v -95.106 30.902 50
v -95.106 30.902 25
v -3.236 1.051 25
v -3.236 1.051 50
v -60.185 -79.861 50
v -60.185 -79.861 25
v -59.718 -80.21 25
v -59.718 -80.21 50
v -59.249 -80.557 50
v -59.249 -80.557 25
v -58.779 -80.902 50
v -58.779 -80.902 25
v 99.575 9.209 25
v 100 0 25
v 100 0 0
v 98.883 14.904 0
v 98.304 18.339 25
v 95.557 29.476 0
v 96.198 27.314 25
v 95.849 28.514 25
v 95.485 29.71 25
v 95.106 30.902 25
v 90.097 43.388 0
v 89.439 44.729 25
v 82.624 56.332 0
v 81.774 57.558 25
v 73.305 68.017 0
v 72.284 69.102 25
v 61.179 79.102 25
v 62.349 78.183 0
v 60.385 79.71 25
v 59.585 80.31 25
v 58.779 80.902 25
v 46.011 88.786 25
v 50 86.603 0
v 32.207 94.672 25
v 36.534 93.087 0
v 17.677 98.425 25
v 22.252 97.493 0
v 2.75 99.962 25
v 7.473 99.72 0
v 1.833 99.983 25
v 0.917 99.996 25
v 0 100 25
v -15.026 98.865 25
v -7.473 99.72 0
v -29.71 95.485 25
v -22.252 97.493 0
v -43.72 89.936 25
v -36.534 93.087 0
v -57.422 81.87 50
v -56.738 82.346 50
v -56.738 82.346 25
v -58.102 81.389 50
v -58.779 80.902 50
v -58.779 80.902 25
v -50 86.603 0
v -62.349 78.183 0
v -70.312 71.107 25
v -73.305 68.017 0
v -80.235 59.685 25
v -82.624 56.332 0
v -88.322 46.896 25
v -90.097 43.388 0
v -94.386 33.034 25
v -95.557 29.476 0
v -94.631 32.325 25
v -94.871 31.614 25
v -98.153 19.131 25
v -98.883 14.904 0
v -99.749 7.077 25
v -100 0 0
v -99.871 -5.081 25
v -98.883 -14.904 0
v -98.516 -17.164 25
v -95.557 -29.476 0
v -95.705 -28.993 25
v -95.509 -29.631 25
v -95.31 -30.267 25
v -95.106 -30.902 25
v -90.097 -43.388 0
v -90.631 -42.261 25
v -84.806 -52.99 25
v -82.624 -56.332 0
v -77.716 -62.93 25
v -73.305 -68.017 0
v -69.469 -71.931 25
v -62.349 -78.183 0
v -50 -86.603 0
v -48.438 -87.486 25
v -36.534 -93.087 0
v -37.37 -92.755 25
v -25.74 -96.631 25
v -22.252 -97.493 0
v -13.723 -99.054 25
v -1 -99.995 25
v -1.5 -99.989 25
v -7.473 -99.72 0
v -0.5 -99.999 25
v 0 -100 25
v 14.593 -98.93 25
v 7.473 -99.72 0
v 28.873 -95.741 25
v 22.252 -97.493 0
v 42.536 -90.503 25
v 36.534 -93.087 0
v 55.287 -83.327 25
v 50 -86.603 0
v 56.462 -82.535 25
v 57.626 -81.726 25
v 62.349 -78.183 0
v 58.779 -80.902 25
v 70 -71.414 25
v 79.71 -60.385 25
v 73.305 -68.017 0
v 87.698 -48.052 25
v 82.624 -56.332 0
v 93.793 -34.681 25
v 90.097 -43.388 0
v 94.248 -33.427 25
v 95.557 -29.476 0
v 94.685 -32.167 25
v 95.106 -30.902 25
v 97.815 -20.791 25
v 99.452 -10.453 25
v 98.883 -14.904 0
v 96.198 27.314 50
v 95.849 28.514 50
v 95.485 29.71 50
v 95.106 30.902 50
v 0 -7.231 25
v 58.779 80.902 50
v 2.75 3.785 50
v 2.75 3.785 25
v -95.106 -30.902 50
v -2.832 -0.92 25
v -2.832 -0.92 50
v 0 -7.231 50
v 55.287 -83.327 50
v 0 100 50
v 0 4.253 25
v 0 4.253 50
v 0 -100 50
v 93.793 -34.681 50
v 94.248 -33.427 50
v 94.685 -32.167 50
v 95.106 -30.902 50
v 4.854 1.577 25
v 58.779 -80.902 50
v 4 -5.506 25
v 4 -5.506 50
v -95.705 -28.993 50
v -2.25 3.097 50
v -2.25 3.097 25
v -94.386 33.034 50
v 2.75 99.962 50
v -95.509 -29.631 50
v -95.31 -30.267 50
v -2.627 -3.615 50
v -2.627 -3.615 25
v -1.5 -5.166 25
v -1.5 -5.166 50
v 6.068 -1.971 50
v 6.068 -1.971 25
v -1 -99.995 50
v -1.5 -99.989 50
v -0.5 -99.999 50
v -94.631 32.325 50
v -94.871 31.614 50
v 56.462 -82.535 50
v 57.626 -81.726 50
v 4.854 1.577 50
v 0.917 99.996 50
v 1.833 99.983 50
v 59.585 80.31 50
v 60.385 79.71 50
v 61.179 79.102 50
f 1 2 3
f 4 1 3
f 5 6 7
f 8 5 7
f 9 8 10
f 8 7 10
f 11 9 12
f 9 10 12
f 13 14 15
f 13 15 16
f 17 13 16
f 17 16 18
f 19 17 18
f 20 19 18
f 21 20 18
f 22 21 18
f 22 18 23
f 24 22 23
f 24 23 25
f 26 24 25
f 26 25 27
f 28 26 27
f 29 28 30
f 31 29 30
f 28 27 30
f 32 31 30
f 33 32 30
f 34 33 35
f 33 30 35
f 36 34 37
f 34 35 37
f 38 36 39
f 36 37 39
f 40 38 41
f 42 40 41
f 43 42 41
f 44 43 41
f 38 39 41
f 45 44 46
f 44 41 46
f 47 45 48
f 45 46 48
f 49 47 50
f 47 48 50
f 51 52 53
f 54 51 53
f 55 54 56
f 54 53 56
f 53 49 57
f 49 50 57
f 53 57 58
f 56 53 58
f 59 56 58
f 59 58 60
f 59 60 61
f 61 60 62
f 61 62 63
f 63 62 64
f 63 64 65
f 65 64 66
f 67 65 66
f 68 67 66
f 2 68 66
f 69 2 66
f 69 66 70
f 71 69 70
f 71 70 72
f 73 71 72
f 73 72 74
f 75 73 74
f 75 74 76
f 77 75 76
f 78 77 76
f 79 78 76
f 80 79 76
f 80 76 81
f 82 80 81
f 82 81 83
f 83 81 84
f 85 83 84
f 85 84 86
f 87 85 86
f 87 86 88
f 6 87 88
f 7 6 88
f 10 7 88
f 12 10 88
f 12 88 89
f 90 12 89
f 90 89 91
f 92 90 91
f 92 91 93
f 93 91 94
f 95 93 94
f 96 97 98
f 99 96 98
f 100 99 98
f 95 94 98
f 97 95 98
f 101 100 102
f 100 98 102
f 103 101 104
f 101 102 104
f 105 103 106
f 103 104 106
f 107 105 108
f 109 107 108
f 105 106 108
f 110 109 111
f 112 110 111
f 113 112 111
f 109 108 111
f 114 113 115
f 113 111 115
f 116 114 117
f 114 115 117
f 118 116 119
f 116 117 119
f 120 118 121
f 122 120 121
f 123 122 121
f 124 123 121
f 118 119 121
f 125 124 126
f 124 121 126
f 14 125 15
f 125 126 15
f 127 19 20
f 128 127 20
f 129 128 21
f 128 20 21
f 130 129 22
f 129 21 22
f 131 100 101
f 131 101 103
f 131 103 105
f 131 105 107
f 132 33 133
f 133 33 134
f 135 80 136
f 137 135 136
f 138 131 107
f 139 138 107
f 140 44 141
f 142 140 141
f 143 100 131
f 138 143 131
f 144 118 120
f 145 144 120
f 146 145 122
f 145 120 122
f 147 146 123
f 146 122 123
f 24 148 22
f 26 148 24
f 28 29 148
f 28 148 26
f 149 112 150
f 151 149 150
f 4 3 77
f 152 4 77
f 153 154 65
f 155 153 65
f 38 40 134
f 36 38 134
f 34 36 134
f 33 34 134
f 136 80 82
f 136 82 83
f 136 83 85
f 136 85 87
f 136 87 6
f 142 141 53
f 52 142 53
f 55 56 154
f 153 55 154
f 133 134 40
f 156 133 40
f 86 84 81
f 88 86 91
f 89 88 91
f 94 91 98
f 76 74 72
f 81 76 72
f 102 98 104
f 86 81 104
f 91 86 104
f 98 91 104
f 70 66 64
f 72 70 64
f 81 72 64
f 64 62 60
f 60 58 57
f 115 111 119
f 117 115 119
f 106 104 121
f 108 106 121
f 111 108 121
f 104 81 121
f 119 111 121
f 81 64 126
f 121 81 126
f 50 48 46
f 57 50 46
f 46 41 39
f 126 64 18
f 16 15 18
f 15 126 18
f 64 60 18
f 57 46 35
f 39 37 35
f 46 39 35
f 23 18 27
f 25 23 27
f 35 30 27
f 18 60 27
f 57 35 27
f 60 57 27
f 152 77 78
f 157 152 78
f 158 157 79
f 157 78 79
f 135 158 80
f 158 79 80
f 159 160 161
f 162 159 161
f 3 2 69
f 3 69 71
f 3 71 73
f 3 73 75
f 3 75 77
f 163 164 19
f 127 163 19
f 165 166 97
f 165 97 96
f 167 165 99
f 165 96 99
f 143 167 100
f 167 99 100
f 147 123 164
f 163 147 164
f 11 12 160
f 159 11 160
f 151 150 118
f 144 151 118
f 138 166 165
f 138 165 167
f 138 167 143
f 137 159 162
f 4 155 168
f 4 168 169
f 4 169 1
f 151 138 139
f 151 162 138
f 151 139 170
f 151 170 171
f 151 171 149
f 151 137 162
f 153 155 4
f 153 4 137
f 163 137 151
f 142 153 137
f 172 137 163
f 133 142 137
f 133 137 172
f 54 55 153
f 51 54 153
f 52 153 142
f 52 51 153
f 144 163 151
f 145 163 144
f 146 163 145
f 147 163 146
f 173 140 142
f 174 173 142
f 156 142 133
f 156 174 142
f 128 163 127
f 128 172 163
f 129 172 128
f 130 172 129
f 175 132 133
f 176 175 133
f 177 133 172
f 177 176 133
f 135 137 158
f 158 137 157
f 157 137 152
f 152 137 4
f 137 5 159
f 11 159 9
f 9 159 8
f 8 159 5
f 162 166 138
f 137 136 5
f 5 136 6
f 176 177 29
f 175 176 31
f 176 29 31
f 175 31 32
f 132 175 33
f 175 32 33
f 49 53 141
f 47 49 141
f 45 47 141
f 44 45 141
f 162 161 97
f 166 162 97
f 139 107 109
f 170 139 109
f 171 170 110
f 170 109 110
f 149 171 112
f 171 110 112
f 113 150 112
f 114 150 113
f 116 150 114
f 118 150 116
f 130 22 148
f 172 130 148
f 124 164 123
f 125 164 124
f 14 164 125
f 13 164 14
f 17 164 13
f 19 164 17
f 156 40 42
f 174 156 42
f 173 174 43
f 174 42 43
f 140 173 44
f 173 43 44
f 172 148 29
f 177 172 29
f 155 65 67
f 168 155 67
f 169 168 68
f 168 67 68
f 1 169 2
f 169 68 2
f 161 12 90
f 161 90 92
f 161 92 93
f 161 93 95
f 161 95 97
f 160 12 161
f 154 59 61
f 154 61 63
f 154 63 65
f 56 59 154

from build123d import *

# Parameters (mm, degrees)
F0_R     = 100
F1_DEPTH = 25
F3_DEPTH = 25


# Not quite as in the source:
# - a feature of the source that left no trace in its solid (it failed there, or was rolled back) is left out


with BuildPart() as f1:
    # F0 (on Top) → F1 (new body)
    with BuildSketch(Plane.XY):
        Circle(F0_R)
    extrude(amount=F1_DEPTH)

    # F2 (on face) → F3 (join)
    with BuildSketch(Plane.XY.offset(25)):
        with BuildLine():
            Line((4, -5.5055276819), (0, -4.205848897))
            Line((0, -4.205848897), (0, -7.230531871))
            Line((0, -7.230531871), (55.287094655, -83.3266893895))
            ThreePointArc((55.287094655, -83.3266893895), (57.0456970679, -82.1327489254), (58.7785252292, -80.9016994375))
            Line((58.7785252292, -80.9016994375), (4, -5.5055276819))
        make_face()
        with BuildLine():
            Line((6.0676274578, -1.9714916704), (2.3176274578, -3.1899405313))
            Line((2.3176274578, -3.1899405313), (4, -5.5055276819))
            Line((4, -5.5055276819), (93.7934686725, -34.6811942467))
            ThreePointArc((93.7934686725, -34.6811942467), (94.4684632985, -32.7980097266), (95.1056516295, -30.9016994375))
            Line((95.1056516295, -30.9016994375), (6.0676274578, -1.9714916704))
        make_face()
        with BuildLine():
            ThreePointArc((2.5, 0), (2.4692208515, -0.3910861626), (2.3776412907, -0.7725424859))
            Line((2.3776412907, -0.7725424859), (3, -0.9747590887))
            Line((3, -0.9747590887), (4.8541019662, 1.5771933364))
            Line((4.8541019662, 1.5771933364), (2.75, 0.8935291646))
            Line((2.75, 0.8935291646), (2.3776412907, 0.7725424859))
            ThreePointArc((2.3776412907, 0.7725424859), (2.4692208515, 0.3910861626), (2.5, 0))
        make_face()
        with BuildLine():
            ThreePointArc((2.0225424859, 1.4694631307), (2.2275163105, 1.1349762493), (2.3776412907, 0.7725424859))
            Line((2.3776412907, 0.7725424859), (2.75, 0.8935291646))
            Line((2.75, 0.8935291646), (2.75, 3.7850502813))
            Line((2.75, 3.7850502813), (1.5450849719, 2.1266270209))
            Line((1.5450849719, 2.1266270209), (2.0225424859, 1.4694631307))
        make_face()
        with BuildLine():
            ThreePointArc((0, 2.5), (0.7725424859, 2.3776412907), (1.4694631307, 2.0225424859))
            Line((1.4694631307, 2.0225424859), (1.5450849719, 2.1266270209))
            Line((1.5450849719, 2.1266270209), (0, 4.2532540418))
            Line((0, 4.2532540418), (0, 2.5))
        make_face()
        with BuildLine():
            ThreePointArc((-0.3411015737, 2.4766206242), (-0.1709509277, 2.4941483076), (0, 2.5))
            Line((0, 2.5), (0, 4.2532540418))
            Line((0, 4.2532540418), (-56.7376115832, 82.3458768356))
            ThreePointArc((-56.7376115832, 82.3458768356), (-57.7625819896, 81.6301667393), (-58.7785252292, 80.9016994375))
            Line((-58.7785252292, 80.9016994375), (-2.25, 3.0968593211))
            Line((-2.25, 3.0968593211), (-0.3411015737, 2.4766206242))
        make_face()
        with BuildLine():
            ThreePointArc((-2.0446187632, 1.438587541), (-1.7811355181, 1.7542965161), (-1.4694631307, 2.0225424859))
            Line((-1.4694631307, 2.0225424859), (-2.25, 3.0968593211))
            Line((-2.25, 3.0968593211), (-94.3862867265, 33.0337536163))
            ThreePointArc((-94.3862867265, 33.0337536163), (-94.7519661497, 31.9697499328), (-95.1056516295, 30.9016994375))
            Line((-95.1056516295, 30.9016994375), (-3.2360679775, 1.0514622242))
            Line((-3.2360679775, 1.0514622242), (-2.0446187632, 1.438587541))
        make_face()
        with BuildLine():
            ThreePointArc((-2.4651863178, -0.4157600492), (-2.4932429766, 0.1836830415), (-2.3776412907, 0.7725424859))
            Line((-2.3776412907, 0.7725424859), (-3.2360679775, 1.0514622242))
            Line((-3.2360679775, 1.0514622242), (-95.7046625854, -28.9934054469))
            ThreePointArc((-95.7046625854, -28.9934054469), (-95.4099282003, -29.9490500819), (-95.1056516295, -30.9016994375))
            Line((-95.1056516295, -30.9016994375), (-2.8315594803, -0.9200294462))
            Line((-2.8315594803, -0.9200294462), (-2.4651863178, -0.4157600492))
        make_face()
        with BuildLine():
            ThreePointArc((-1.5, -2), (-2.0336392212, -1.4540672329), (-2.3776412907, -0.7725424859))
            Line((-2.3776412907, -0.7725424859), (-2.8315594803, -0.9200294462))
            Line((-2.8315594803, -0.9200294462), (-60.1853038185, -79.8606862246))
            ThreePointArc((-60.1853038185, -79.8606862246), (-59.4841918711, -80.384270336), (-58.7785252292, -80.9016994375))
            Line((-58.7785252292, -80.9016994375), (-2.6266444522, -3.6152659355))
            Line((-2.6266444522, -3.6152659355), (-1.5, -2.0645728807))
            Line((-1.5, -2.0645728807), (-1.5, -2))
        make_face()
        with BuildLine():
            Line((0, -100), (0, -7.230531871))
            Line((0, -7.230531871), (-1.5, -5.1659589903))
            Line((-1.5, -5.1659589903), (-1.5, -99.9887493671))
            ThreePointArc((-1.5, -99.9887493671), (-0.7500210958, -99.9971873022), (0, -100))
        make_face()
        with BuildLine():
            Line((0, 4.2532540418), (1.5450849719, 2.1266270209))
            Line((1.5450849719, 2.1266270209), (2.75, 3.7850502813))
            Line((2.75, 3.7850502813), (2.75, 99.9621803484))
            ThreePointArc((2.75, 99.9621803484), (1.3751300235, 99.9905446401), (0, 100))
            Line((0, 100), (0, 4.2532540418))
        make_face()
        with BuildLine():
            Line((2.75, 3.7850502813), (2.75, 0.8935291646))
            Line((2.75, 0.8935291646), (4.8541019662, 1.5771933364))
            Line((4.8541019662, 1.5771933364), (61.179119922, 79.1019297209))
            ThreePointArc((61.179119922, 79.1019297209), (59.9855728515, 80.010818329), (58.7785252292, 80.9016994375))
            Line((58.7785252292, 80.9016994375), (2.75, 3.7850502813))
        make_face()
        with BuildLine():
            Line((4.8541019662, 1.5771933364), (3, -0.9747590887))
            Line((3, -0.9747590887), (6.0676274578, -1.9714916704))
            Line((6.0676274578, -1.9714916704), (96.1975706712, 27.3135020999))
            ThreePointArc((96.1975706712, 27.3135020999), (95.6684352631, 29.1127204897), (95.1056516295, 30.9016994375))
            Line((95.1056516295, 30.9016994375), (4.8541019662, 1.5771933364))
        make_face()
        with BuildLine():
            Line((1.5450849719, 2.1266270209), (1.4694631307, 2.0225424859))
            ThreePointArc((1.4694631307, 2.0225424859), (1.767766953, 1.767766953), (2.0225424859, 1.4694631307))
            Line((2.0225424859, 1.4694631307), (1.5450849719, 2.1266270209))
        make_face()
        with BuildLine():
            ThreePointArc((-1.4694631307, 2.0225424859), (-0.9333182073, 2.3192492587), (-0.3411015737, 2.4766206242))
            Line((-0.3411015737, 2.4766206242), (-2.25, 3.0968593211))
            Line((-2.25, 3.0968593211), (-1.4694631307, 2.0225424859))
        make_face()
        with BuildLine():
            ThreePointArc((-2.3776412907, 0.7725424859), (-2.2360679775, 1.1180339887), (-2.0446187632, 1.438587541))
            Line((-2.0446187632, 1.438587541), (-3.2360679775, 1.0514622242))
            Line((-3.2360679775, 1.0514622242), (-2.3776412907, 0.7725424859))
        make_face()
        with BuildLine():
            ThreePointArc((-2.3776412907, -0.7725424859), (-2.427976161, -0.5957614973), (-2.4651863178, -0.4157600492))
            Line((-2.4651863178, -0.4157600492), (-2.8315594803, -0.9200294462))
            Line((-2.8315594803, -0.9200294462), (-2.3776412907, -0.7725424859))
        make_face()
        with BuildLine():
            Line((-1.5, -2.0645728807), (-1.4694631307, -2.0225424859))
            ThreePointArc((-1.4694631307, -2.0225424859), (-1.4847743472, -2.0113291968), (-1.5, -2))
            Line((-1.5, -2), (-1.5, -2.0645728807))
        make_face()
        with BuildLine():
            ThreePointArc((1.4694631307, -2.0225424859), (0.7725424859, -2.3776412907), (0, -2.5))
            Line((0, -2.5), (0, -4.205848897))
            Line((0, -4.205848897), (4, -5.5055276819))
            Line((4, -5.5055276819), (2.3176274578, -3.1899405313))
            Line((2.3176274578, -3.1899405313), (1.4694631307, -2.0225424859))
        make_face()
        with BuildLine():
            ThreePointArc((2.3776412907, -0.7725424859), (2.0225424859, -1.4694631307), (1.4694631307, -2.0225424859))
            Line((1.4694631307, -2.0225424859), (2.3176274578, -3.1899405313))
            Line((2.3176274578, -3.1899405313), (6.0676274578, -1.9714916704))
            Line((6.0676274578, -1.9714916704), (3, -0.9747590887))
            Line((3, -0.9747590887), (2.3776412907, -0.7725424859))
        make_face()
        with BuildLine():
            Line((0, -4.205848897), (0, -2.5))
            ThreePointArc((0, -2.5), (-0.7725424859, -2.3776412907), (-1.4694631307, -2.0225424859))
            Line((-1.4694631307, -2.0225424859), (-1.5, -2.0645728807))
            Line((-1.5, -2.0645728807), (-1.5, -5.1659589903))
            Line((-1.5, -5.1659589903), (0, -7.230531871))
            Line((0, -7.230531871), (0, -4.205848897))
        make_face()
        Polygon((-1.5, -5.1659589903), (-1.5, -2.0645728807), (-2.6266444522, -3.6152659355), align=None)
        with BuildLine():
            Line((1.4694631307, -2.0225424859), (0, 0))
            Line((0, 0), (0, -2.5))
            ThreePointArc((0, -2.5), (0.7725424859, -2.3776412907), (1.4694631307, -2.0225424859))
        make_face()
        with BuildLine():
            Line((2.3776412907, -0.7725424859), (0, 0))
            Line((0, 0), (1.4694631307, -2.0225424859))
            ThreePointArc((1.4694631307, -2.0225424859), (2.0225424859, -1.4694631307), (2.3776412907, -0.7725424859))
        make_face()
        with BuildLine():
            Line((2.3776412907, 0.7725424859), (0, 0))
            Line((0, 0), (2.3776412907, -0.7725424859))
            ThreePointArc((2.3776412907, -0.7725424859), (2.4692208515, -0.3910861626), (2.5, 0))
            ThreePointArc((2.5, 0), (2.4692208515, 0.3910861626), (2.3776412907, 0.7725424859))
        make_face()
        with BuildLine():
            Line((1.4694631307, 2.0225424859), (0, 0))
            Line((0, 0), (2.3776412907, 0.7725424859))
            ThreePointArc((2.3776412907, 0.7725424859), (2.2275163105, 1.1349762493), (2.0225424859, 1.4694631307))
            ThreePointArc((2.0225424859, 1.4694631307), (1.767766953, 1.767766953), (1.4694631307, 2.0225424859))
        make_face()
        with BuildLine():
            Line((0, 2.3657900045), (0, 0))
            Line((0, 0), (1.4694631307, 2.0225424859))
            ThreePointArc((1.4694631307, 2.0225424859), (0.7725424859, 2.3776412907), (0, 2.5))
            Line((0, 2.5), (0, 2.3657900045))
        make_face()
        with BuildLine():
            Line((-1.2360679775, 1.7013016167), (0, 0))
            Line((0, 0), (0, 2.3657900045))
            Line((0, 2.3657900045), (-0.3411015737, 2.4766206242))
            ThreePointArc((-0.3411015737, 2.4766206242), (-0.9333182073, 2.3192492587), (-1.4694631307, 2.0225424859))
            Line((-1.4694631307, 2.0225424859), (-1.2360679775, 1.7013016167))
        make_face()
        with BuildLine():
            Line((-1.75, 0.5686094684), (0, 0))
            Line((0, 0), (-1.2360679775, 1.7013016167))
            Line((-1.2360679775, 1.7013016167), (-2.0446187632, 1.438587541))
            ThreePointArc((-2.0446187632, 1.438587541), (-2.2360679775, 1.1180339887), (-2.3776412907, 0.7725424859))
            Line((-2.3776412907, 0.7725424859), (-1.75, 0.5686094684))
        make_face()
        with BuildLine():
            Line((-1.5, -0.4873795443), (0, 0))
            Line((0, 0), (-1.75, 0.5686094684))
            Line((-1.75, 0.5686094684), (-2.4651863178, -0.4157600492))
            ThreePointArc((-2.4651863178, -0.4157600492), (-2.427976161, -0.5957614973), (-2.3776412907, -0.7725424859))
            Line((-2.3776412907, -0.7725424859), (-1.5, -0.4873795443))
        make_face()
        with BuildLine():
            Line((-1.4694631307, -2.0225424859), (0, 0))
            Line((0, 0), (-1.5, -0.4873795443))
            Line((-1.5, -0.4873795443), (-1.5, -2))
            ThreePointArc((-1.5, -2), (-1.4847743472, -2.0113291968), (-1.4694631307, -2.0225424859))
        make_face()
        with BuildLine():
            Line((0, -2.5), (0, 0))
            Line((0, 0), (-1.4694631307, -2.0225424859))
            ThreePointArc((-1.4694631307, -2.0225424859), (-0.7725424859, -2.3776412907), (0, -2.5))
        make_face()
        with BuildLine():
            Line((-1.5, -2), (-1.5, -0.4873795443))
            Line((-1.5, -0.4873795443), (-2.3776412907, -0.7725424859))
            ThreePointArc((-2.3776412907, -0.7725424859), (-2.0336392212, -1.4540672329), (-1.5, -2))
        make_face()
        with BuildLine():
            Line((-2.4651863178, -0.4157600492), (-1.75, 0.5686094684))
            Line((-1.75, 0.5686094684), (-2.3776412907, 0.7725424859))
            ThreePointArc((-2.3776412907, 0.7725424859), (-2.4932429766, 0.1836830415), (-2.4651863178, -0.4157600492))
        make_face()
        with BuildLine():
            Line((-2.0446187632, 1.438587541), (-1.2360679775, 1.7013016167))
            Line((-1.2360679775, 1.7013016167), (-1.4694631307, 2.0225424859))
            ThreePointArc((-1.4694631307, 2.0225424859), (-1.7811355181, 1.7542965161), (-2.0446187632, 1.438587541))
        make_face()
        with BuildLine():
            Line((-0.3411015737, 2.4766206242), (0, 2.3657900045))
            Line((0, 2.3657900045), (0, 2.5))
            ThreePointArc((0, 2.5), (-0.1709509277, 2.4941483076), (-0.3411015737, 2.4766206242))
        make_face()
    extrude(amount=F3_DEPTH)


solid = f1.part
